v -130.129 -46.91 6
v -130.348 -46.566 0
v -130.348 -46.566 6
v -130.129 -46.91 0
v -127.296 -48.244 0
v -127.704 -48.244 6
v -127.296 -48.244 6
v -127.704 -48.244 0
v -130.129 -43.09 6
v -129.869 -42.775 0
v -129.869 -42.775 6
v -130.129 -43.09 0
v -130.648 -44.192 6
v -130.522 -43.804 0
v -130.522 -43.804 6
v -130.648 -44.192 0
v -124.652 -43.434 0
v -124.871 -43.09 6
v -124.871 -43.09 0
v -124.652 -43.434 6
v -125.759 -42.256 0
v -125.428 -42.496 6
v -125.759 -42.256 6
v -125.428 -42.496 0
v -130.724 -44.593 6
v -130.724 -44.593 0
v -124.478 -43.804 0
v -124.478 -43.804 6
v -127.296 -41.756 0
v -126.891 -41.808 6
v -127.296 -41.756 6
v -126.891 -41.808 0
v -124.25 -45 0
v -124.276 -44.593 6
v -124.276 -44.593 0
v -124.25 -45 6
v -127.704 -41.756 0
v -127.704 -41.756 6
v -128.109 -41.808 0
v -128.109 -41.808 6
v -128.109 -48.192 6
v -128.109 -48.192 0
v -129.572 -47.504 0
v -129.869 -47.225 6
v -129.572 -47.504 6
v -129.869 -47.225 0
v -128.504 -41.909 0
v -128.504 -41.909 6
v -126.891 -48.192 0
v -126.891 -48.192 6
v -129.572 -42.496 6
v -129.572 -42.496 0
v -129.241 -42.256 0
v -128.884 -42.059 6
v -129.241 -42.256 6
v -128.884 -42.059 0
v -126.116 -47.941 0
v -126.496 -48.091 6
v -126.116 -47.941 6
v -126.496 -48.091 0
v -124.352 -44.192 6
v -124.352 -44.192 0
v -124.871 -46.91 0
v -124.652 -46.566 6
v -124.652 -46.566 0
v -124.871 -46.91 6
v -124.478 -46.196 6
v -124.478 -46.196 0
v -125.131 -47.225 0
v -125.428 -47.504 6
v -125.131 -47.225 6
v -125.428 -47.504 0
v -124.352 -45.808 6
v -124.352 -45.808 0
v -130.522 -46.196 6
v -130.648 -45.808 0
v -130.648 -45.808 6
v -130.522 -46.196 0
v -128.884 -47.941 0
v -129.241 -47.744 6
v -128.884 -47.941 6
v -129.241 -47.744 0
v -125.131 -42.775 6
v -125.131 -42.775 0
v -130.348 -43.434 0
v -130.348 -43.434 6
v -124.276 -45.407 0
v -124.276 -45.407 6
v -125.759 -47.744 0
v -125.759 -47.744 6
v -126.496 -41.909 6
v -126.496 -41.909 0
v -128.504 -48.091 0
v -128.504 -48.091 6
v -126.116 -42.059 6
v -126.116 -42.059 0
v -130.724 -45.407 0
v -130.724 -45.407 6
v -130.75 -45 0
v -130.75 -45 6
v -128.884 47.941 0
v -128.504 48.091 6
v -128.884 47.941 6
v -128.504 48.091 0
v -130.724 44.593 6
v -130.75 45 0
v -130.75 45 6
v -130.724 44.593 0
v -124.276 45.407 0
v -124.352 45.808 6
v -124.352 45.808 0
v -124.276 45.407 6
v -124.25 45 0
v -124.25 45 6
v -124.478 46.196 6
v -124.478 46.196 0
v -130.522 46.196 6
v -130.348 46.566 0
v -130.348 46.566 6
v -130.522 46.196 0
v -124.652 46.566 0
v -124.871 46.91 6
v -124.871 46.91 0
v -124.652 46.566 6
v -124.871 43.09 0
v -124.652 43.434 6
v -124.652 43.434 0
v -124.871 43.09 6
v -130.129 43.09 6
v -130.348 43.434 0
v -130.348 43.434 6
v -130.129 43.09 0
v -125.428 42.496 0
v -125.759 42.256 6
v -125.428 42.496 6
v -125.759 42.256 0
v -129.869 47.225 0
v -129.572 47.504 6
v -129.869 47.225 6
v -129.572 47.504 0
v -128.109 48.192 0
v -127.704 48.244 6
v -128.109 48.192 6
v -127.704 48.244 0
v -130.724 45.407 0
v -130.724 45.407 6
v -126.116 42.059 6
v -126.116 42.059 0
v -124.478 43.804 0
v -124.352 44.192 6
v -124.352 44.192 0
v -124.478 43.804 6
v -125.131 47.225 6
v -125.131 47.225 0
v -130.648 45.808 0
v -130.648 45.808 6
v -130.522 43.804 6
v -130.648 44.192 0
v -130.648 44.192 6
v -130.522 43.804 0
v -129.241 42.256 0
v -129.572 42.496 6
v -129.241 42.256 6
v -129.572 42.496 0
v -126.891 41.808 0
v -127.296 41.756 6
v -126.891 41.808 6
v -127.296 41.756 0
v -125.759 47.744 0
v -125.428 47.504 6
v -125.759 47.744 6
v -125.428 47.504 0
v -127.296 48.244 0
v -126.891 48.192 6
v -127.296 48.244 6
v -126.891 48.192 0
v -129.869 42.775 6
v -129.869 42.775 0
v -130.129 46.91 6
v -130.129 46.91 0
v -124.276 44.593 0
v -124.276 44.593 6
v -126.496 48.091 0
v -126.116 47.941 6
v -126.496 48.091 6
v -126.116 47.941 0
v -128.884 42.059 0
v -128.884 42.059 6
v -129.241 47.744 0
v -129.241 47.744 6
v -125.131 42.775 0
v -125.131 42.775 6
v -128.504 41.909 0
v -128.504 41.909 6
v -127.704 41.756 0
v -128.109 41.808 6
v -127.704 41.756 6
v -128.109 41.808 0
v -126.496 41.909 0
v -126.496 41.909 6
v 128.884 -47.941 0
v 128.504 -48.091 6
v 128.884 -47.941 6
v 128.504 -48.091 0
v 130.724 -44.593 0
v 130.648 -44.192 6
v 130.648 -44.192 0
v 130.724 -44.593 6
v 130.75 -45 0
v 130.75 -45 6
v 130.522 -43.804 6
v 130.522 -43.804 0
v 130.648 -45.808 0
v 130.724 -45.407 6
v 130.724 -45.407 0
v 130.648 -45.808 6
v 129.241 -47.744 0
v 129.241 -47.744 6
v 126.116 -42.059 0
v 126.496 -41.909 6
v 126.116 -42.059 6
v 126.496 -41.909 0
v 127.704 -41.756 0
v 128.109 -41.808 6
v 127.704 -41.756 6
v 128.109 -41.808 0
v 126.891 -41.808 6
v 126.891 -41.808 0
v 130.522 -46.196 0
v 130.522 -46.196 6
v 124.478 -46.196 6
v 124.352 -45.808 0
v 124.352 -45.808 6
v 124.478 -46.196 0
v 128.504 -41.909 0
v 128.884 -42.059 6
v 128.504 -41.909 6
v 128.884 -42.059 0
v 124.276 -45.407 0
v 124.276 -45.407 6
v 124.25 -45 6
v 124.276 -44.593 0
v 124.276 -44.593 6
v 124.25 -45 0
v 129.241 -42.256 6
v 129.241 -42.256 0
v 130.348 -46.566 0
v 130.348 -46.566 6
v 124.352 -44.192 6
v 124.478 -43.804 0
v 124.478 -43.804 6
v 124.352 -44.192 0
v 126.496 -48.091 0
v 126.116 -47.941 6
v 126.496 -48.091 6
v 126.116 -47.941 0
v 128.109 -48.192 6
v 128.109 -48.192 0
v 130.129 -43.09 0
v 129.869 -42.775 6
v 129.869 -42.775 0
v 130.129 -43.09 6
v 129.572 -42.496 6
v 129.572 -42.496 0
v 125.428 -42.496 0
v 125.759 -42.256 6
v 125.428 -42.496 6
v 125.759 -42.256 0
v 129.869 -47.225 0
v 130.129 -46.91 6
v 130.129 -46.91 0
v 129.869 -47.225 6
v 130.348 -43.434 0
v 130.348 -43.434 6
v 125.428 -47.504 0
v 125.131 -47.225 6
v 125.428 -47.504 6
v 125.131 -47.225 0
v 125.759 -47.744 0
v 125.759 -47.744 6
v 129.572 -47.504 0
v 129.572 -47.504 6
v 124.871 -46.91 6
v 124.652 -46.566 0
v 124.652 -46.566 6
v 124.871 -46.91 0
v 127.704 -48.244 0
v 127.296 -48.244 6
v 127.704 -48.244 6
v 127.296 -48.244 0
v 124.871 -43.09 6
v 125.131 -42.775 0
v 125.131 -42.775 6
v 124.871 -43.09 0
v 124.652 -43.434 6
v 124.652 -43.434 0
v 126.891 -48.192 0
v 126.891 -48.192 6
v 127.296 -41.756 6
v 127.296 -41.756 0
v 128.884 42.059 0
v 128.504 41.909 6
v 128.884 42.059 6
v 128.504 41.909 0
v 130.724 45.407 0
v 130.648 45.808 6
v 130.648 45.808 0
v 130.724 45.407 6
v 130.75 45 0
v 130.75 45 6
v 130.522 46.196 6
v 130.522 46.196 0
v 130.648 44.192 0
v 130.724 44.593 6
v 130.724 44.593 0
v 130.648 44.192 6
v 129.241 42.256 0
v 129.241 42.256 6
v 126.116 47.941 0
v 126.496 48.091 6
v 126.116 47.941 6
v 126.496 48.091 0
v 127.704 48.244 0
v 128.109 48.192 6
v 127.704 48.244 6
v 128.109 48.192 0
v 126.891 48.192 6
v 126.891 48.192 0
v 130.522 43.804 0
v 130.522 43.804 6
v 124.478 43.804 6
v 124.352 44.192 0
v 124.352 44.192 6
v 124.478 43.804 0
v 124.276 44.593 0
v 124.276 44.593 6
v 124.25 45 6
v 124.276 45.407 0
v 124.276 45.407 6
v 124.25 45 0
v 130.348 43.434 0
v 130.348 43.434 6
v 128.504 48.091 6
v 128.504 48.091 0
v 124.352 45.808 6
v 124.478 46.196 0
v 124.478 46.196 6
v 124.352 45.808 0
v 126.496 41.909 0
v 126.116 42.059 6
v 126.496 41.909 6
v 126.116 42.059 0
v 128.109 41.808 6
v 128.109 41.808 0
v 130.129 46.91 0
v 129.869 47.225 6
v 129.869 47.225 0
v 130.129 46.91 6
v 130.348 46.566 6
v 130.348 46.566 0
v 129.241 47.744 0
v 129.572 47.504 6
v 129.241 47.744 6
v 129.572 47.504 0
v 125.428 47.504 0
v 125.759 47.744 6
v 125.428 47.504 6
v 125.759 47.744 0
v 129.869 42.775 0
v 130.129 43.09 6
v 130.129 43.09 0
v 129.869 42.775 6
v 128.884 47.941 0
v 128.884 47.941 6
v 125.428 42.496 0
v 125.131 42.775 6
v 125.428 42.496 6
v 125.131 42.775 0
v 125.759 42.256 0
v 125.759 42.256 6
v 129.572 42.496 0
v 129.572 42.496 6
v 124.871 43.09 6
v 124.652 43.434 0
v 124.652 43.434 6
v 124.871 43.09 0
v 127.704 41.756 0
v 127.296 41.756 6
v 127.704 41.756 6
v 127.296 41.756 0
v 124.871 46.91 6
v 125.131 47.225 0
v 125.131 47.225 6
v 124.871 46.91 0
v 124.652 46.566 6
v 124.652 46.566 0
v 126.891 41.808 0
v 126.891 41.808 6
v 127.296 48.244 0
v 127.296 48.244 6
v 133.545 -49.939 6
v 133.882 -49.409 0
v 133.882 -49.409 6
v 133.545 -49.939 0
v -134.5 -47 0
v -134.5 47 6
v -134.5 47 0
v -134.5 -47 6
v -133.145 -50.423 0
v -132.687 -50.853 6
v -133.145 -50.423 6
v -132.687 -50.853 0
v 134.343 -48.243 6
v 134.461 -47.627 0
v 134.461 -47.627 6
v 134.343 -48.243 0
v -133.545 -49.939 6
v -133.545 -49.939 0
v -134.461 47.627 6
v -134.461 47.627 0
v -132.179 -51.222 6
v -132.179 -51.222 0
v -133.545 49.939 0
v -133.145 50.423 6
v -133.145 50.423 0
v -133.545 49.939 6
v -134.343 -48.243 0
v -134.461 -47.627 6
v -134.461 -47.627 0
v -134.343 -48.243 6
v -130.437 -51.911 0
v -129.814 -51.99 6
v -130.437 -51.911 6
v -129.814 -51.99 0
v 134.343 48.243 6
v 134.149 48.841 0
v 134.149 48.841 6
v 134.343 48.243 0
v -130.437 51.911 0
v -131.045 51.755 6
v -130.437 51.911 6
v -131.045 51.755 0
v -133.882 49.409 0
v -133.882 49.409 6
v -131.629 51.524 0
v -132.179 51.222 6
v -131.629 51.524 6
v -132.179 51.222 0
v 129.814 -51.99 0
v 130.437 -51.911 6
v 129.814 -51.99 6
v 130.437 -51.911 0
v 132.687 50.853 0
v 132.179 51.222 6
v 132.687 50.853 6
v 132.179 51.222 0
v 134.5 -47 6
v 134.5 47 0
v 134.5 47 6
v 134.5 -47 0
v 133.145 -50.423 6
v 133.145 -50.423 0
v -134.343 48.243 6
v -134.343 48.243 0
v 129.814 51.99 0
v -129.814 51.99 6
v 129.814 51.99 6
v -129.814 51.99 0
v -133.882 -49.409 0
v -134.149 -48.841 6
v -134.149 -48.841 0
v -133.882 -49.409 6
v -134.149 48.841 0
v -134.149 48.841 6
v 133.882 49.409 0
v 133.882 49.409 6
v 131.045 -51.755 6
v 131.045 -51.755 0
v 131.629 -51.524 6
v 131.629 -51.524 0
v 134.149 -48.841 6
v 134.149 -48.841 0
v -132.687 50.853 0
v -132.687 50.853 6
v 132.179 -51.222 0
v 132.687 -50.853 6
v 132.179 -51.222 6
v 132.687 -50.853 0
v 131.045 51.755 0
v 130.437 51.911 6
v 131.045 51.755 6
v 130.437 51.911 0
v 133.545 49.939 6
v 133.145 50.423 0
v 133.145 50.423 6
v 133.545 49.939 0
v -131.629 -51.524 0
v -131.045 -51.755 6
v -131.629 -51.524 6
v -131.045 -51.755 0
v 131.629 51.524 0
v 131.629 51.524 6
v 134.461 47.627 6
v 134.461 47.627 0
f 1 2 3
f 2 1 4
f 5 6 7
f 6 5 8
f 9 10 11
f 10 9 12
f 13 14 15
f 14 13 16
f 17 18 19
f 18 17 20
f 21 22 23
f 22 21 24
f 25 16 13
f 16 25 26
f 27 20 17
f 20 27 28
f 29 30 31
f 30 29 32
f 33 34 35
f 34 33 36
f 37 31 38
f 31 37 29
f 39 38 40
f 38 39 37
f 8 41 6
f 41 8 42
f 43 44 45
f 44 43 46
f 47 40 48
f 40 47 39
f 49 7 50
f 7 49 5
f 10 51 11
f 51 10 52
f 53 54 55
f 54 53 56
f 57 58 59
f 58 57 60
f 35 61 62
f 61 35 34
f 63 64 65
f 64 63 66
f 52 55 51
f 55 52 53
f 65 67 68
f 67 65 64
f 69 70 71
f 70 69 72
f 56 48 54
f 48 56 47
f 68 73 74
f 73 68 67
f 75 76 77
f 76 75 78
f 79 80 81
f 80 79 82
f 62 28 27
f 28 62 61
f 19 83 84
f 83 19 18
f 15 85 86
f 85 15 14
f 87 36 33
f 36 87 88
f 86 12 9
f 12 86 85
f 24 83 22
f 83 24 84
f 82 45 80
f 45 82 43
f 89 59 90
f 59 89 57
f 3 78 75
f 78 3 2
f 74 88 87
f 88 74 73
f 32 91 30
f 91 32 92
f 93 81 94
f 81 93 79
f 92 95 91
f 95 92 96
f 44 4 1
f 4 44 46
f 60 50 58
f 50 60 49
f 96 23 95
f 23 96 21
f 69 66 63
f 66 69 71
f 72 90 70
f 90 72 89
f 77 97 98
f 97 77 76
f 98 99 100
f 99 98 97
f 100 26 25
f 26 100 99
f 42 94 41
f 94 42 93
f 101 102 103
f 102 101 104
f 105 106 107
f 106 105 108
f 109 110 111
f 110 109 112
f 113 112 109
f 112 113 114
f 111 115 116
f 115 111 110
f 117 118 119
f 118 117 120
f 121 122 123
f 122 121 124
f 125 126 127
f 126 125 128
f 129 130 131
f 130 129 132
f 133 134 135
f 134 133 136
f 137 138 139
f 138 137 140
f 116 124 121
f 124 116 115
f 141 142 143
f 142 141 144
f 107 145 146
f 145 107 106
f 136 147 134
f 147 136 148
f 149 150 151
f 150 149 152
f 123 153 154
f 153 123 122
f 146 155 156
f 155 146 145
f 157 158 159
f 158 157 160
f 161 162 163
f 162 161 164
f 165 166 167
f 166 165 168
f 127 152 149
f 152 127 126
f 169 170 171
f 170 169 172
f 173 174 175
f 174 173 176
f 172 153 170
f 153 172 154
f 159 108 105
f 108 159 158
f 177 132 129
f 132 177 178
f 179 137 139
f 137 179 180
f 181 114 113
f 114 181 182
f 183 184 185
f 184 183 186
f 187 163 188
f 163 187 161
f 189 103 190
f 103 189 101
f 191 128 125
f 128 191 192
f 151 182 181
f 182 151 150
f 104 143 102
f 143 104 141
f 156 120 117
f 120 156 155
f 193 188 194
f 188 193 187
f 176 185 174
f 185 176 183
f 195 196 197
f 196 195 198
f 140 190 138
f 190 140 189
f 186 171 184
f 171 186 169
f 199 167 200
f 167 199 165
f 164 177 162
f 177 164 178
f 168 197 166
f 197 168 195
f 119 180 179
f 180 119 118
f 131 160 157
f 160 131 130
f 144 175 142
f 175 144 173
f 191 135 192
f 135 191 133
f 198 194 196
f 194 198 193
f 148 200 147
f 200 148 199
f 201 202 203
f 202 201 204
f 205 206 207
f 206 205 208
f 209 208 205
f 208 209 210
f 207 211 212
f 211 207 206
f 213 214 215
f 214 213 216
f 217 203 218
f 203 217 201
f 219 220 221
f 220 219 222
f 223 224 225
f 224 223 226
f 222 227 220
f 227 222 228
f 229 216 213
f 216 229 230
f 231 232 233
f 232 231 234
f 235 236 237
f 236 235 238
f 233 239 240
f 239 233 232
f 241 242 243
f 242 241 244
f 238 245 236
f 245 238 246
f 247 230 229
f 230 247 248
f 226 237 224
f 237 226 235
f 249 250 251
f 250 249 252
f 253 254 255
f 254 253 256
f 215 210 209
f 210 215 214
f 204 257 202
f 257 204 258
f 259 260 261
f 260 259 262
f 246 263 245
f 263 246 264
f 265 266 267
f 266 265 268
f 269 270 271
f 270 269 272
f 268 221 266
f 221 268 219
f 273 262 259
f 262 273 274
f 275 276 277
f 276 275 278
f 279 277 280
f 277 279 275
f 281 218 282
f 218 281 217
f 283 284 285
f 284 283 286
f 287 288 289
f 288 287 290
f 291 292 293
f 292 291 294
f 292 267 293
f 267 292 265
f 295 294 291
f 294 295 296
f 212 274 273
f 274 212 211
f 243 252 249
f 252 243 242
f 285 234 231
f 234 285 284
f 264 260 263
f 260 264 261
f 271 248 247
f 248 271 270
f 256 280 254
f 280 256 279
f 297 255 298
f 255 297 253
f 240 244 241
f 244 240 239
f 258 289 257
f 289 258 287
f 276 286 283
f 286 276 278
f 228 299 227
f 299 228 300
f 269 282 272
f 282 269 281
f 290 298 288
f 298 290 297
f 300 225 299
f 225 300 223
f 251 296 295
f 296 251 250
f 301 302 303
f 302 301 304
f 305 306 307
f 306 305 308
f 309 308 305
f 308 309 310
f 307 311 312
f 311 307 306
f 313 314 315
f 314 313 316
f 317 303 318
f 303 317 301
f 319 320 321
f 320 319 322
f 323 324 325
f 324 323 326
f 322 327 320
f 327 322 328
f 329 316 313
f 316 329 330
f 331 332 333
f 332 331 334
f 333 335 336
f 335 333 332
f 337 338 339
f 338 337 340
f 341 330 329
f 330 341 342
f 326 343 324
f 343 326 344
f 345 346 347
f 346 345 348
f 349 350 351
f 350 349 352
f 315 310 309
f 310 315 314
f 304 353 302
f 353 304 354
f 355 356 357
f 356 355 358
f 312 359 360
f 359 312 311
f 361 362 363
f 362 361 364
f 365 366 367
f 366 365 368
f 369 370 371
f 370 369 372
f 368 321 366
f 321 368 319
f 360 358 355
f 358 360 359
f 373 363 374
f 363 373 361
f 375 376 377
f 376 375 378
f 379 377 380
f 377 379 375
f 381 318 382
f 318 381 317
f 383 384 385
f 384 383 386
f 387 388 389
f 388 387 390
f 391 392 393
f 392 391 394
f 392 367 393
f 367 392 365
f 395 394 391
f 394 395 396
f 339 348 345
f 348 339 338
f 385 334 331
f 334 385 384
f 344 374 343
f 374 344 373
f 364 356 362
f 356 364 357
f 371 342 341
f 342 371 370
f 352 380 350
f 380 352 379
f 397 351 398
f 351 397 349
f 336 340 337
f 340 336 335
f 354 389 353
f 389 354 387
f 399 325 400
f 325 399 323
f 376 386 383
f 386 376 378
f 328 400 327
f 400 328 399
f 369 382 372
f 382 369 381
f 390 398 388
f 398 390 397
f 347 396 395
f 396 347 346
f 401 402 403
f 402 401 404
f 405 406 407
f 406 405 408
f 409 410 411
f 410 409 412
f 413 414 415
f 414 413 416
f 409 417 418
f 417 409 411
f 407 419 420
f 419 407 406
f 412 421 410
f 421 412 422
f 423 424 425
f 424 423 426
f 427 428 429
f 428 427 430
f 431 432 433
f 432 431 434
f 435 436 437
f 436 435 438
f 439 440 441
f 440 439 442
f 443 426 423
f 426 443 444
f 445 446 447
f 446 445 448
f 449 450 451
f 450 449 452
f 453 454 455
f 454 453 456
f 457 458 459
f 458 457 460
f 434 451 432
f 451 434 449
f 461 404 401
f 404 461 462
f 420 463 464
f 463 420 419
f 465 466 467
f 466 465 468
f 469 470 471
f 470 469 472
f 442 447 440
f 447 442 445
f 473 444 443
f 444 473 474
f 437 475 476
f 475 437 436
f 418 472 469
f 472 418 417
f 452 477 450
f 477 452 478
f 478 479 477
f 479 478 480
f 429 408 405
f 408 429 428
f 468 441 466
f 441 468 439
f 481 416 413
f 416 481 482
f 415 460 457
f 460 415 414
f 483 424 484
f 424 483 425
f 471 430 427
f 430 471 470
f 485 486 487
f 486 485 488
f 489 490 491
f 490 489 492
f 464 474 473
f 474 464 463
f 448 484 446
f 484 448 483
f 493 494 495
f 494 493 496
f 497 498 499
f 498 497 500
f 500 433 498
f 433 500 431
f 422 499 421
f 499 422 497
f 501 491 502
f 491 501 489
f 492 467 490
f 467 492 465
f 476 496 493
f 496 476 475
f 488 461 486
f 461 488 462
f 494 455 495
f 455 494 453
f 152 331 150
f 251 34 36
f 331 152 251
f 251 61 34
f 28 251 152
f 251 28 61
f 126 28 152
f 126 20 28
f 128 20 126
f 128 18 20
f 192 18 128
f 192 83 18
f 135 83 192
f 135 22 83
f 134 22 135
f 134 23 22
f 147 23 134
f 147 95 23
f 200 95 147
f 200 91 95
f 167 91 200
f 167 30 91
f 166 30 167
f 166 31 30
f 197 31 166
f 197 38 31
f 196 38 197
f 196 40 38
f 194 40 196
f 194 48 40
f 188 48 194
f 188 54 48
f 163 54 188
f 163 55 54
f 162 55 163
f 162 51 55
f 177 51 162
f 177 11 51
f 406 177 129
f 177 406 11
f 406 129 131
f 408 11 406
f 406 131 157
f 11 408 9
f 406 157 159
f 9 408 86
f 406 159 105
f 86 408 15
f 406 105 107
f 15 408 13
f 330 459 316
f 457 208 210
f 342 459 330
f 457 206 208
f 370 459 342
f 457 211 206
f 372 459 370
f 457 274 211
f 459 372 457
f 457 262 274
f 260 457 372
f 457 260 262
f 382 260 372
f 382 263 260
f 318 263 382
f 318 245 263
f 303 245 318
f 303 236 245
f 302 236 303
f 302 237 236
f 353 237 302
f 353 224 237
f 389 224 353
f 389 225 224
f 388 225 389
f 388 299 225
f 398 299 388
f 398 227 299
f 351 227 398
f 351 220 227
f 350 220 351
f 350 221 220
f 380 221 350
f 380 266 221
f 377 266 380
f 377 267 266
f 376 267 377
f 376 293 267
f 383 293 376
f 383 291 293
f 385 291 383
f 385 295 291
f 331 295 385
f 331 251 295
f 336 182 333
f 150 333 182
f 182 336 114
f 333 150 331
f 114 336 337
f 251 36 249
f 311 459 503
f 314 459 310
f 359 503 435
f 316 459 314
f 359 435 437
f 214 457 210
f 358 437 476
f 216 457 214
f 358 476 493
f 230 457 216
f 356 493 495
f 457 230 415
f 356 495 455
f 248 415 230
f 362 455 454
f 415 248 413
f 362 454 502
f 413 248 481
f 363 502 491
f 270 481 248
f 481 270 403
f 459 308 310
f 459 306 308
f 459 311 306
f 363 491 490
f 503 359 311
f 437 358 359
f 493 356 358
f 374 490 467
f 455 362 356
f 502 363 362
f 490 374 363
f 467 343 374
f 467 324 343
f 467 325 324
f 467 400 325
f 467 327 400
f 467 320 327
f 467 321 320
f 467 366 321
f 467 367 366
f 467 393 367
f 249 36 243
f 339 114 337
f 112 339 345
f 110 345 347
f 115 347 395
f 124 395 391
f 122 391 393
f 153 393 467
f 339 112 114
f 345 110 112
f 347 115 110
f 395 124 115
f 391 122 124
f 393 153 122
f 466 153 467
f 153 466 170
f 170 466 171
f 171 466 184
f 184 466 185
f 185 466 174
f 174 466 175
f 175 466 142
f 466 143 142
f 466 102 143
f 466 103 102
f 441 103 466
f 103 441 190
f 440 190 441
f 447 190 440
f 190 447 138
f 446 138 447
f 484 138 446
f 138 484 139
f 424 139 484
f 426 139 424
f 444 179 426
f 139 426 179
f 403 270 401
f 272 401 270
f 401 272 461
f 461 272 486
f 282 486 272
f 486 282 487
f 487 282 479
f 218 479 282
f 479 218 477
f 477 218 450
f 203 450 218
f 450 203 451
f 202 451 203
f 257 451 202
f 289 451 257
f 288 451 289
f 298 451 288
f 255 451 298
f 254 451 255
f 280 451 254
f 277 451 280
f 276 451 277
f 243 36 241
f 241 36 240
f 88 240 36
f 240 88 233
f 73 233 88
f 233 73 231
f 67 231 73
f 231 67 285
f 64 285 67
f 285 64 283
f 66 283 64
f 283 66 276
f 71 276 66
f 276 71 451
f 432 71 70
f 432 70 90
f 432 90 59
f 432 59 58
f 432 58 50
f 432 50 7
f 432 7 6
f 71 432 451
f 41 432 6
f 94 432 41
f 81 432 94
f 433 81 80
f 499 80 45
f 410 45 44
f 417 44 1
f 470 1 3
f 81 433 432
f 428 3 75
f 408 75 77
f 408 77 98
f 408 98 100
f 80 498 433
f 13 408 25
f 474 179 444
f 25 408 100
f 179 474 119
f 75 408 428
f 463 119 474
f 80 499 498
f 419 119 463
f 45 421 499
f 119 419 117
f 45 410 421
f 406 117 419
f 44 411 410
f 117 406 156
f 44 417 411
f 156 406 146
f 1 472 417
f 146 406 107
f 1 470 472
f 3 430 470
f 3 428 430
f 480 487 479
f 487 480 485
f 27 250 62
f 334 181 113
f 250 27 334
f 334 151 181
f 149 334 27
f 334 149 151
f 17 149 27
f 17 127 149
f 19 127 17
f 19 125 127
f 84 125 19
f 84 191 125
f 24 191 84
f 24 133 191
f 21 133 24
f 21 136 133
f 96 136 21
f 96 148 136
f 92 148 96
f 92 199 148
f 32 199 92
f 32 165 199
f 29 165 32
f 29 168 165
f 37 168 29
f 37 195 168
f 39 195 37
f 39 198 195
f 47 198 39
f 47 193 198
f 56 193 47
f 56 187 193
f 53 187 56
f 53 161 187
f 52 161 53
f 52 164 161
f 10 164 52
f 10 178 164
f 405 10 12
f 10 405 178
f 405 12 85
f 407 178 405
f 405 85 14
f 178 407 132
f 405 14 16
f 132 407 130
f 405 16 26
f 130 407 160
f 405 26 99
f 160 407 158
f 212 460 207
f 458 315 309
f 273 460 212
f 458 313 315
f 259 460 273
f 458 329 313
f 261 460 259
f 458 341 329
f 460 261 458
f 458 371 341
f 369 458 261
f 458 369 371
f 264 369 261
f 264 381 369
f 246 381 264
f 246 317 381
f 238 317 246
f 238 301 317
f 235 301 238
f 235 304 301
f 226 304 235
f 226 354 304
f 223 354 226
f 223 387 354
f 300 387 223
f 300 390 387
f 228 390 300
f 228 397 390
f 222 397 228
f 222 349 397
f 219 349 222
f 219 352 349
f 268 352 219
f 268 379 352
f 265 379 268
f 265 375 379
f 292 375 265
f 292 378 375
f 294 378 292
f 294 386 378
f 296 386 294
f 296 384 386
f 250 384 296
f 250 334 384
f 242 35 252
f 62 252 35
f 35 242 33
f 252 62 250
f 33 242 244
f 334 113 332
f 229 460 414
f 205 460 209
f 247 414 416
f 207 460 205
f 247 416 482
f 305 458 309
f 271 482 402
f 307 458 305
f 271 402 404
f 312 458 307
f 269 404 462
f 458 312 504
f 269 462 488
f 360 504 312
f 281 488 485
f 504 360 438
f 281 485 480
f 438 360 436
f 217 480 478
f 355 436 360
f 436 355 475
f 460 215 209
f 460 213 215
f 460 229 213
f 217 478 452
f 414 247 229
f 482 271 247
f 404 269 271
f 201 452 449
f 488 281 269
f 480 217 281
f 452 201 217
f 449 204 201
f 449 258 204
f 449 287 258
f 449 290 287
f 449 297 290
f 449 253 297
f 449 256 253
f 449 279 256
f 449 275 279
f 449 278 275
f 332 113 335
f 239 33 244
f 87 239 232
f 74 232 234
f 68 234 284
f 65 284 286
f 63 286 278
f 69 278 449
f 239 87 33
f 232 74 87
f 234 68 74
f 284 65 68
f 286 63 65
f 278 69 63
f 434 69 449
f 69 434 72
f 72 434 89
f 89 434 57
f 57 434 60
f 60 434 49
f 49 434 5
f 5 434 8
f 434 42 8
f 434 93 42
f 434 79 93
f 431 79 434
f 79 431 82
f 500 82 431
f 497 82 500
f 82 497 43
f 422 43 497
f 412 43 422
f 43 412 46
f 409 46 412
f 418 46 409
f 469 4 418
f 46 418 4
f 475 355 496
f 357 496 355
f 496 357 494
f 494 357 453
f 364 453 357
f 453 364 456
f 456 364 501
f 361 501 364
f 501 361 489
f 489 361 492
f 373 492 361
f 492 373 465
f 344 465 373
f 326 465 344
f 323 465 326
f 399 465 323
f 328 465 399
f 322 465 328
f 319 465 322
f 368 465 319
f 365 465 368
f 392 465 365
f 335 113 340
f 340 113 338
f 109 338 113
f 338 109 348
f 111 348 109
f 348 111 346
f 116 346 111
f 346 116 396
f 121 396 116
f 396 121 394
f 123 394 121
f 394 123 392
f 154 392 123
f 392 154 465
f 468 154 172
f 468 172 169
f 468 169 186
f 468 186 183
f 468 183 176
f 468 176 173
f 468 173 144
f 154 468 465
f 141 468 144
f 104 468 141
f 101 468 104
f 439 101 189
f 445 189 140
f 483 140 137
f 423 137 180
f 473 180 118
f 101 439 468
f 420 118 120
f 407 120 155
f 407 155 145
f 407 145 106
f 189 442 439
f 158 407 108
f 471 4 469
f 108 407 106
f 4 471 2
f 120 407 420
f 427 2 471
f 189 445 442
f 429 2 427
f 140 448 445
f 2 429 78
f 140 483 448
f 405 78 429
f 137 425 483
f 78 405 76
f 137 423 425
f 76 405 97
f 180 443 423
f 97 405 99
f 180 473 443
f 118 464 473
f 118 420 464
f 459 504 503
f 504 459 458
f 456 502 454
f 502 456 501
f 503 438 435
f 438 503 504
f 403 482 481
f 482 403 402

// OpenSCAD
$fn = 50;


difference() {
	union() {
		hull() {
			translate(v = [-129.5000000000, 47.0000000000, 0]) {
				cylinder(h = 6, r = 5);
			}
			translate(v = [129.5000000000, 47.0000000000, 0]) {
				cylinder(h = 6, r = 5);
			}
			translate(v = [-129.5000000000, -47.0000000000, 0]) {
				cylinder(h = 6, r = 5);
			}
			translate(v = [129.5000000000, -47.0000000000, 0]) {
				cylinder(h = 6, r = 5);
			}
		}
	}
	union() {
		translate(v = [-127.5000000000, -45.0000000000, -100.0000000000]) {
			cylinder(h = 200, r = 3.2500000000);
		}
		translate(v = [-127.5000000000, 45.0000000000, -100.0000000000]) {
			cylinder(h = 200, r = 3.2500000000);
		}
		translate(v = [127.5000000000, -45.0000000000, -100.0000000000]) {
			cylinder(h = 200, r = 3.2500000000);
		}
		translate(v = [127.5000000000, 45.0000000000, -100.0000000000]) {
			cylinder(h = 200, r = 3.2500000000);
		}
	}
}
